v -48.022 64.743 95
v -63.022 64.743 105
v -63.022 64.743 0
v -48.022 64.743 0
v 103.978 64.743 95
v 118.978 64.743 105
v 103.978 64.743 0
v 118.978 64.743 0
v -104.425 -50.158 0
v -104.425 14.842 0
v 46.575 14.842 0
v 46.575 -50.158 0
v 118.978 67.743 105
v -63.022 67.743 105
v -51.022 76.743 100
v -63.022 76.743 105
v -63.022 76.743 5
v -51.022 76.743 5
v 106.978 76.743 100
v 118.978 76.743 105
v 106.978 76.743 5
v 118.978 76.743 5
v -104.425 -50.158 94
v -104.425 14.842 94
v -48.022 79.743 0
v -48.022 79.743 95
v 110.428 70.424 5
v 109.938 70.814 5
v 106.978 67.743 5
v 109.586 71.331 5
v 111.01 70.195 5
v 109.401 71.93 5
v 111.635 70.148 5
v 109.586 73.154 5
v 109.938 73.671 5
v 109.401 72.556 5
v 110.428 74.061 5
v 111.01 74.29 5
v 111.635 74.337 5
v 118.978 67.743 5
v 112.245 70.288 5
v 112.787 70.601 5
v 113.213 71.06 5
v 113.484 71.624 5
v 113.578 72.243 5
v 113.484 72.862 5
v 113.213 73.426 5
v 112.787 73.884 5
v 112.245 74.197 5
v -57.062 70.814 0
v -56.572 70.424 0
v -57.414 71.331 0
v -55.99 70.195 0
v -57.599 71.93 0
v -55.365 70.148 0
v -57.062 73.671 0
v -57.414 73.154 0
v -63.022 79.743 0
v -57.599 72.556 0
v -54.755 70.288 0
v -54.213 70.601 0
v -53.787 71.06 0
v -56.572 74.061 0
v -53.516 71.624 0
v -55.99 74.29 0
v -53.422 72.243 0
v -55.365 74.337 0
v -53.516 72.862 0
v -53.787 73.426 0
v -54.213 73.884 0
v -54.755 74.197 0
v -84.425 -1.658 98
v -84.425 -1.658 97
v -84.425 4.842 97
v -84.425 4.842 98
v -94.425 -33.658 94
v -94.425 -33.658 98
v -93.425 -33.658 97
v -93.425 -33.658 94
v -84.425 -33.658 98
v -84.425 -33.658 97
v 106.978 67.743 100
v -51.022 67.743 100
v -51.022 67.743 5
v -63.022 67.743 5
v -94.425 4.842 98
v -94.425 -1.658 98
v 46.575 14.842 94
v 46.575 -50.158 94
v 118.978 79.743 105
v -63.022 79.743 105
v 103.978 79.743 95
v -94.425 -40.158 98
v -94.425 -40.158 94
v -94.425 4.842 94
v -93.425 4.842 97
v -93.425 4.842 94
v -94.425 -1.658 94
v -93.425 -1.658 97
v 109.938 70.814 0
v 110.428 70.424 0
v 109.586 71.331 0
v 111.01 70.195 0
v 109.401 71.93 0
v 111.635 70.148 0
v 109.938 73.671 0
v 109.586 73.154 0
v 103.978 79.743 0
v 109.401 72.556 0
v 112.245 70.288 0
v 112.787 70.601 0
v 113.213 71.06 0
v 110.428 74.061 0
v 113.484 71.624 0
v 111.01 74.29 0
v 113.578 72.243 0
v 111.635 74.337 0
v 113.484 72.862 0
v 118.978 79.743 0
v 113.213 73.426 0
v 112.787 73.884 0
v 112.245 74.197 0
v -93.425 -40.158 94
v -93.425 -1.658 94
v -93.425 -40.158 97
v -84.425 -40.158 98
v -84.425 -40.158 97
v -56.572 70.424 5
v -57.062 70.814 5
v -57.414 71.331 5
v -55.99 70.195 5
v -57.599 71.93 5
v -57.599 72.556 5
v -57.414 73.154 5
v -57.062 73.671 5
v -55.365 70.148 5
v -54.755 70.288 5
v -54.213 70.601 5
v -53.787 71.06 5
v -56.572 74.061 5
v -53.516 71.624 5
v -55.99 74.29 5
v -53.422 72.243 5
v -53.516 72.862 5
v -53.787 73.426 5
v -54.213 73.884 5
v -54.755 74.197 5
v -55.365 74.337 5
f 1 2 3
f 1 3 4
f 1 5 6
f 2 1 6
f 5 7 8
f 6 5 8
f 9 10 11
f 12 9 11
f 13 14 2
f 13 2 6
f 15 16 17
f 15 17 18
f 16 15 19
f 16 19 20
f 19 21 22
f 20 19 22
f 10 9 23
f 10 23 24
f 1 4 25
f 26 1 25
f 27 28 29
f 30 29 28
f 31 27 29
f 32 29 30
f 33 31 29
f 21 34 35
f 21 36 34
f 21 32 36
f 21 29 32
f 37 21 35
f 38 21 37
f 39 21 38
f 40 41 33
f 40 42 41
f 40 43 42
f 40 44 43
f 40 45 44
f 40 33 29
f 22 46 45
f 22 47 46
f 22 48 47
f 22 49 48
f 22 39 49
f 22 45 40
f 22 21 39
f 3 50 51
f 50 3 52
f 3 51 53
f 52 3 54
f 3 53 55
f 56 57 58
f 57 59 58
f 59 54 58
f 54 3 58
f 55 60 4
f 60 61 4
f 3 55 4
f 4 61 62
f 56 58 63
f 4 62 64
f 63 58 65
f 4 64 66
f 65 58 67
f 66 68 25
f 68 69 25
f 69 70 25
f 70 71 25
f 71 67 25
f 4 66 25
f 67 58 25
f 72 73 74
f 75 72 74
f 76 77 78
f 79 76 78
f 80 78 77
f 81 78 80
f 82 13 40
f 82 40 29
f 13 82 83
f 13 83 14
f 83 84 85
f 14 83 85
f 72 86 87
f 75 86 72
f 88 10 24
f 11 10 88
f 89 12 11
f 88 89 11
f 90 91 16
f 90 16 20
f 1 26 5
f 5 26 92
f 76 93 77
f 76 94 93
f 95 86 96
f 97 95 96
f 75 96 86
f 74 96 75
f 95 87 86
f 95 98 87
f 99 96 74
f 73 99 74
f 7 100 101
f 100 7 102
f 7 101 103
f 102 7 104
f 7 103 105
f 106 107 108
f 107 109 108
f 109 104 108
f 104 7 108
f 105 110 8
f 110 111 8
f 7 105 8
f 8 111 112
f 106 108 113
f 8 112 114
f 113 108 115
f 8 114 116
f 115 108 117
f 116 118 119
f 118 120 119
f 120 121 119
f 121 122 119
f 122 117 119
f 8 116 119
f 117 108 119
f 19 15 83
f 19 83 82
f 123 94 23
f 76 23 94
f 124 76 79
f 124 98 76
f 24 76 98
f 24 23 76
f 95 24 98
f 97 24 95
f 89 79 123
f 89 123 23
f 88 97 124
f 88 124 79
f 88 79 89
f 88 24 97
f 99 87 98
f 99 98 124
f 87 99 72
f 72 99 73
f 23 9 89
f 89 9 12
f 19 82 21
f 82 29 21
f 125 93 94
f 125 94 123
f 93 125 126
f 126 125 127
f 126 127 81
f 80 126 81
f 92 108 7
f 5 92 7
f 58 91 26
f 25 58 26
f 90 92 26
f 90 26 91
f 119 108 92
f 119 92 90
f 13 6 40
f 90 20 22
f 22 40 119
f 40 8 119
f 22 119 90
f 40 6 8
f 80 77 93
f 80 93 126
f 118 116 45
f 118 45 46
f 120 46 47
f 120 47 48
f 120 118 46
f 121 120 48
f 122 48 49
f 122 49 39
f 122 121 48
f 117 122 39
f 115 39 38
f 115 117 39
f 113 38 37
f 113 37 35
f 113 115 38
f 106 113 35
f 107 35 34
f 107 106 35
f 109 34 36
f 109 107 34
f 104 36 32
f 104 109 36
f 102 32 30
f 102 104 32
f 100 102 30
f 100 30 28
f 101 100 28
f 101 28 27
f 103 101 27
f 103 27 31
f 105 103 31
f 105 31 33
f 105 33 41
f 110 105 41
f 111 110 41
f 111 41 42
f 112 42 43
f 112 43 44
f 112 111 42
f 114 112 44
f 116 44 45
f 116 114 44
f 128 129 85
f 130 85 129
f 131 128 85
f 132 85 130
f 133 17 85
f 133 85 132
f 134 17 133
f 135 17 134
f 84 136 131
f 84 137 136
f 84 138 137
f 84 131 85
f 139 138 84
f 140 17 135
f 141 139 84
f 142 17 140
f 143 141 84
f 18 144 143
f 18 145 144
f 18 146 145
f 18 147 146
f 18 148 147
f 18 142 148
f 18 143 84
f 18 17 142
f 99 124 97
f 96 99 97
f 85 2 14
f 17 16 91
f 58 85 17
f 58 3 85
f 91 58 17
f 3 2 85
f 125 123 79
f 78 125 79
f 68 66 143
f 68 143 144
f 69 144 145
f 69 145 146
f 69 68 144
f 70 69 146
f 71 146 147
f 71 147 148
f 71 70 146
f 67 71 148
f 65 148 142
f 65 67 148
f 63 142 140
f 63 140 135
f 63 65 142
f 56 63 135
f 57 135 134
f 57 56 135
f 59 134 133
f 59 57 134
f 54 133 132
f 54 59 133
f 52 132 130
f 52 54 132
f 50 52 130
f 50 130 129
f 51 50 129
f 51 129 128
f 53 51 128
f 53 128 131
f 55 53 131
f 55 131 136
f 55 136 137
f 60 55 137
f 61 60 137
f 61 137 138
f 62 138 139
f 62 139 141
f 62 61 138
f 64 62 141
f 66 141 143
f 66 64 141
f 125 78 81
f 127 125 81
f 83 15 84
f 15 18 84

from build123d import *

# Parameters (mm, degrees)
F0_W      = 151
F0_H      = 65
F1_DEPTH  = 94
F2_W      = 1
F2_H      = 6.5
F3_DEPTH  = 3
F4_W      = 10
F4_H      = 6.5
F5_DEPTH  = 1
F6_W      = 10
F6_H      = 6.5
F7_DEPTH  = 1
F8_W      = 15
F8_H      = 15
F8_R      = 2.1
F9_DEPTH  = 5
F11_DEPTH = 90
F13_DEPTH = 90
F15_DEPTH = 5
F16_W     = 182
F16_H     = 3
F17_DEPTH = 5


with BuildPart() as f1:
    # F0 (on Top) → F1 (new body)
    with BuildSketch(Plane.XY):
        with Locations((-28.925121, -17.65754)):
            Rectangle(F0_W, F0_H)
    extrude(amount=F1_DEPTH)

    # F2 (on face) → F3 (join)
    with BuildSketch(Plane.XY.offset(94)):
        with Locations((-93.925121, -36.90754)):
            Rectangle(F2_W, F2_H)
        with Locations((-93.925121, 1.59246)):
            Rectangle(F2_W, F2_H)
    extrude(amount=F3_DEPTH)

    # F4 (on face) → F5 (join)
    with BuildSketch(Plane.XY.offset(97)):
        with Locations((-89.425121, -36.90754)):
            Rectangle(F4_W, F4_H)
    extrude(amount=F5_DEPTH)

    # F6 (on face) → F7 (join)
    with BuildSketch(Plane.XY.offset(97)):
        with Locations((-89.425121, 1.59246)):
            Rectangle(F6_W, F6_H)
    extrude(amount=F7_DEPTH)


with BuildPart() as f9:
    # F8 (on Top) → F9 (new body)
    with BuildSketch(Plane.XY):
        with Locations((-55.52233, 72.242535)):
            Rectangle(F8_W, F8_H)
        with Locations((-55.52233, 72.242535)):
            Circle(F8_R, mode=Mode.SUBTRACT)
        with Locations((111.47767, 72.242535)):
            Rectangle(F8_W, F8_H)
        with Locations((111.47767, 72.242535)):
            Circle(F8_R, mode=Mode.SUBTRACT)
    extrude(amount=F9_DEPTH)

    # F10 (on face) → F11 (join)
    with BuildSketch(Plane.XY.offset(5)):
        Polygon((-48.02233, 79.742535), (-63.02233, 79.742535), (-63.02233, 76.742535), (-51.02233, 76.742535), (-51.02233, 67.742535), (-63.02233, 67.742535), (-63.02233, 64.742535), (-48.02233, 64.742535), align=None)
    extrude(amount=F11_DEPTH)

    # F12 (on face) → F13 (join)
    with BuildSketch(Plane.XY.offset(5)):
        Polygon((103.97767, 64.742535), (118.97767, 64.742535), (118.97767, 67.742535), (106.97767, 67.742535), (106.97767, 76.742535), (118.97767, 76.742535), (118.97767, 79.742535), (103.97767, 79.742535), align=None)
    extrude(amount=F13_DEPTH)

    # F14 (on face) → F15 (join)
    with BuildSketch(Plane.XY.offset(95)):
        Polygon((103.97767, 79.742535), (-48.02233, 79.742535), (-63.02233, 79.742535), (-63.02233, 76.742535), (-51.02233, 76.742535), (-51.02233, 67.742535), (-63.02233, 67.742535), (-63.02233, 64.742535), (-48.02233, 64.742535), (103.97767, 64.742535), (118.97767, 64.742535), (118.97767, 67.742535), (106.97767, 67.742535), (106.97767, 76.742535), (118.97767, 76.742535), (118.97767, 79.742535), align=None)
    extrude(amount=F15_DEPTH)

    # F16 (on face) → F17 (join)
    with BuildSketch(Plane.XY.offset(100)):
        with Locations((27.97767, 78.242535)):
            Rectangle(F16_W, F16_H)
        with Locations((27.97767, 66.242535)):
            Rectangle(F16_W, F16_H)
    extrude(amount=F17_DEPTH)


solid = Compound([f1.part, f9.part])
